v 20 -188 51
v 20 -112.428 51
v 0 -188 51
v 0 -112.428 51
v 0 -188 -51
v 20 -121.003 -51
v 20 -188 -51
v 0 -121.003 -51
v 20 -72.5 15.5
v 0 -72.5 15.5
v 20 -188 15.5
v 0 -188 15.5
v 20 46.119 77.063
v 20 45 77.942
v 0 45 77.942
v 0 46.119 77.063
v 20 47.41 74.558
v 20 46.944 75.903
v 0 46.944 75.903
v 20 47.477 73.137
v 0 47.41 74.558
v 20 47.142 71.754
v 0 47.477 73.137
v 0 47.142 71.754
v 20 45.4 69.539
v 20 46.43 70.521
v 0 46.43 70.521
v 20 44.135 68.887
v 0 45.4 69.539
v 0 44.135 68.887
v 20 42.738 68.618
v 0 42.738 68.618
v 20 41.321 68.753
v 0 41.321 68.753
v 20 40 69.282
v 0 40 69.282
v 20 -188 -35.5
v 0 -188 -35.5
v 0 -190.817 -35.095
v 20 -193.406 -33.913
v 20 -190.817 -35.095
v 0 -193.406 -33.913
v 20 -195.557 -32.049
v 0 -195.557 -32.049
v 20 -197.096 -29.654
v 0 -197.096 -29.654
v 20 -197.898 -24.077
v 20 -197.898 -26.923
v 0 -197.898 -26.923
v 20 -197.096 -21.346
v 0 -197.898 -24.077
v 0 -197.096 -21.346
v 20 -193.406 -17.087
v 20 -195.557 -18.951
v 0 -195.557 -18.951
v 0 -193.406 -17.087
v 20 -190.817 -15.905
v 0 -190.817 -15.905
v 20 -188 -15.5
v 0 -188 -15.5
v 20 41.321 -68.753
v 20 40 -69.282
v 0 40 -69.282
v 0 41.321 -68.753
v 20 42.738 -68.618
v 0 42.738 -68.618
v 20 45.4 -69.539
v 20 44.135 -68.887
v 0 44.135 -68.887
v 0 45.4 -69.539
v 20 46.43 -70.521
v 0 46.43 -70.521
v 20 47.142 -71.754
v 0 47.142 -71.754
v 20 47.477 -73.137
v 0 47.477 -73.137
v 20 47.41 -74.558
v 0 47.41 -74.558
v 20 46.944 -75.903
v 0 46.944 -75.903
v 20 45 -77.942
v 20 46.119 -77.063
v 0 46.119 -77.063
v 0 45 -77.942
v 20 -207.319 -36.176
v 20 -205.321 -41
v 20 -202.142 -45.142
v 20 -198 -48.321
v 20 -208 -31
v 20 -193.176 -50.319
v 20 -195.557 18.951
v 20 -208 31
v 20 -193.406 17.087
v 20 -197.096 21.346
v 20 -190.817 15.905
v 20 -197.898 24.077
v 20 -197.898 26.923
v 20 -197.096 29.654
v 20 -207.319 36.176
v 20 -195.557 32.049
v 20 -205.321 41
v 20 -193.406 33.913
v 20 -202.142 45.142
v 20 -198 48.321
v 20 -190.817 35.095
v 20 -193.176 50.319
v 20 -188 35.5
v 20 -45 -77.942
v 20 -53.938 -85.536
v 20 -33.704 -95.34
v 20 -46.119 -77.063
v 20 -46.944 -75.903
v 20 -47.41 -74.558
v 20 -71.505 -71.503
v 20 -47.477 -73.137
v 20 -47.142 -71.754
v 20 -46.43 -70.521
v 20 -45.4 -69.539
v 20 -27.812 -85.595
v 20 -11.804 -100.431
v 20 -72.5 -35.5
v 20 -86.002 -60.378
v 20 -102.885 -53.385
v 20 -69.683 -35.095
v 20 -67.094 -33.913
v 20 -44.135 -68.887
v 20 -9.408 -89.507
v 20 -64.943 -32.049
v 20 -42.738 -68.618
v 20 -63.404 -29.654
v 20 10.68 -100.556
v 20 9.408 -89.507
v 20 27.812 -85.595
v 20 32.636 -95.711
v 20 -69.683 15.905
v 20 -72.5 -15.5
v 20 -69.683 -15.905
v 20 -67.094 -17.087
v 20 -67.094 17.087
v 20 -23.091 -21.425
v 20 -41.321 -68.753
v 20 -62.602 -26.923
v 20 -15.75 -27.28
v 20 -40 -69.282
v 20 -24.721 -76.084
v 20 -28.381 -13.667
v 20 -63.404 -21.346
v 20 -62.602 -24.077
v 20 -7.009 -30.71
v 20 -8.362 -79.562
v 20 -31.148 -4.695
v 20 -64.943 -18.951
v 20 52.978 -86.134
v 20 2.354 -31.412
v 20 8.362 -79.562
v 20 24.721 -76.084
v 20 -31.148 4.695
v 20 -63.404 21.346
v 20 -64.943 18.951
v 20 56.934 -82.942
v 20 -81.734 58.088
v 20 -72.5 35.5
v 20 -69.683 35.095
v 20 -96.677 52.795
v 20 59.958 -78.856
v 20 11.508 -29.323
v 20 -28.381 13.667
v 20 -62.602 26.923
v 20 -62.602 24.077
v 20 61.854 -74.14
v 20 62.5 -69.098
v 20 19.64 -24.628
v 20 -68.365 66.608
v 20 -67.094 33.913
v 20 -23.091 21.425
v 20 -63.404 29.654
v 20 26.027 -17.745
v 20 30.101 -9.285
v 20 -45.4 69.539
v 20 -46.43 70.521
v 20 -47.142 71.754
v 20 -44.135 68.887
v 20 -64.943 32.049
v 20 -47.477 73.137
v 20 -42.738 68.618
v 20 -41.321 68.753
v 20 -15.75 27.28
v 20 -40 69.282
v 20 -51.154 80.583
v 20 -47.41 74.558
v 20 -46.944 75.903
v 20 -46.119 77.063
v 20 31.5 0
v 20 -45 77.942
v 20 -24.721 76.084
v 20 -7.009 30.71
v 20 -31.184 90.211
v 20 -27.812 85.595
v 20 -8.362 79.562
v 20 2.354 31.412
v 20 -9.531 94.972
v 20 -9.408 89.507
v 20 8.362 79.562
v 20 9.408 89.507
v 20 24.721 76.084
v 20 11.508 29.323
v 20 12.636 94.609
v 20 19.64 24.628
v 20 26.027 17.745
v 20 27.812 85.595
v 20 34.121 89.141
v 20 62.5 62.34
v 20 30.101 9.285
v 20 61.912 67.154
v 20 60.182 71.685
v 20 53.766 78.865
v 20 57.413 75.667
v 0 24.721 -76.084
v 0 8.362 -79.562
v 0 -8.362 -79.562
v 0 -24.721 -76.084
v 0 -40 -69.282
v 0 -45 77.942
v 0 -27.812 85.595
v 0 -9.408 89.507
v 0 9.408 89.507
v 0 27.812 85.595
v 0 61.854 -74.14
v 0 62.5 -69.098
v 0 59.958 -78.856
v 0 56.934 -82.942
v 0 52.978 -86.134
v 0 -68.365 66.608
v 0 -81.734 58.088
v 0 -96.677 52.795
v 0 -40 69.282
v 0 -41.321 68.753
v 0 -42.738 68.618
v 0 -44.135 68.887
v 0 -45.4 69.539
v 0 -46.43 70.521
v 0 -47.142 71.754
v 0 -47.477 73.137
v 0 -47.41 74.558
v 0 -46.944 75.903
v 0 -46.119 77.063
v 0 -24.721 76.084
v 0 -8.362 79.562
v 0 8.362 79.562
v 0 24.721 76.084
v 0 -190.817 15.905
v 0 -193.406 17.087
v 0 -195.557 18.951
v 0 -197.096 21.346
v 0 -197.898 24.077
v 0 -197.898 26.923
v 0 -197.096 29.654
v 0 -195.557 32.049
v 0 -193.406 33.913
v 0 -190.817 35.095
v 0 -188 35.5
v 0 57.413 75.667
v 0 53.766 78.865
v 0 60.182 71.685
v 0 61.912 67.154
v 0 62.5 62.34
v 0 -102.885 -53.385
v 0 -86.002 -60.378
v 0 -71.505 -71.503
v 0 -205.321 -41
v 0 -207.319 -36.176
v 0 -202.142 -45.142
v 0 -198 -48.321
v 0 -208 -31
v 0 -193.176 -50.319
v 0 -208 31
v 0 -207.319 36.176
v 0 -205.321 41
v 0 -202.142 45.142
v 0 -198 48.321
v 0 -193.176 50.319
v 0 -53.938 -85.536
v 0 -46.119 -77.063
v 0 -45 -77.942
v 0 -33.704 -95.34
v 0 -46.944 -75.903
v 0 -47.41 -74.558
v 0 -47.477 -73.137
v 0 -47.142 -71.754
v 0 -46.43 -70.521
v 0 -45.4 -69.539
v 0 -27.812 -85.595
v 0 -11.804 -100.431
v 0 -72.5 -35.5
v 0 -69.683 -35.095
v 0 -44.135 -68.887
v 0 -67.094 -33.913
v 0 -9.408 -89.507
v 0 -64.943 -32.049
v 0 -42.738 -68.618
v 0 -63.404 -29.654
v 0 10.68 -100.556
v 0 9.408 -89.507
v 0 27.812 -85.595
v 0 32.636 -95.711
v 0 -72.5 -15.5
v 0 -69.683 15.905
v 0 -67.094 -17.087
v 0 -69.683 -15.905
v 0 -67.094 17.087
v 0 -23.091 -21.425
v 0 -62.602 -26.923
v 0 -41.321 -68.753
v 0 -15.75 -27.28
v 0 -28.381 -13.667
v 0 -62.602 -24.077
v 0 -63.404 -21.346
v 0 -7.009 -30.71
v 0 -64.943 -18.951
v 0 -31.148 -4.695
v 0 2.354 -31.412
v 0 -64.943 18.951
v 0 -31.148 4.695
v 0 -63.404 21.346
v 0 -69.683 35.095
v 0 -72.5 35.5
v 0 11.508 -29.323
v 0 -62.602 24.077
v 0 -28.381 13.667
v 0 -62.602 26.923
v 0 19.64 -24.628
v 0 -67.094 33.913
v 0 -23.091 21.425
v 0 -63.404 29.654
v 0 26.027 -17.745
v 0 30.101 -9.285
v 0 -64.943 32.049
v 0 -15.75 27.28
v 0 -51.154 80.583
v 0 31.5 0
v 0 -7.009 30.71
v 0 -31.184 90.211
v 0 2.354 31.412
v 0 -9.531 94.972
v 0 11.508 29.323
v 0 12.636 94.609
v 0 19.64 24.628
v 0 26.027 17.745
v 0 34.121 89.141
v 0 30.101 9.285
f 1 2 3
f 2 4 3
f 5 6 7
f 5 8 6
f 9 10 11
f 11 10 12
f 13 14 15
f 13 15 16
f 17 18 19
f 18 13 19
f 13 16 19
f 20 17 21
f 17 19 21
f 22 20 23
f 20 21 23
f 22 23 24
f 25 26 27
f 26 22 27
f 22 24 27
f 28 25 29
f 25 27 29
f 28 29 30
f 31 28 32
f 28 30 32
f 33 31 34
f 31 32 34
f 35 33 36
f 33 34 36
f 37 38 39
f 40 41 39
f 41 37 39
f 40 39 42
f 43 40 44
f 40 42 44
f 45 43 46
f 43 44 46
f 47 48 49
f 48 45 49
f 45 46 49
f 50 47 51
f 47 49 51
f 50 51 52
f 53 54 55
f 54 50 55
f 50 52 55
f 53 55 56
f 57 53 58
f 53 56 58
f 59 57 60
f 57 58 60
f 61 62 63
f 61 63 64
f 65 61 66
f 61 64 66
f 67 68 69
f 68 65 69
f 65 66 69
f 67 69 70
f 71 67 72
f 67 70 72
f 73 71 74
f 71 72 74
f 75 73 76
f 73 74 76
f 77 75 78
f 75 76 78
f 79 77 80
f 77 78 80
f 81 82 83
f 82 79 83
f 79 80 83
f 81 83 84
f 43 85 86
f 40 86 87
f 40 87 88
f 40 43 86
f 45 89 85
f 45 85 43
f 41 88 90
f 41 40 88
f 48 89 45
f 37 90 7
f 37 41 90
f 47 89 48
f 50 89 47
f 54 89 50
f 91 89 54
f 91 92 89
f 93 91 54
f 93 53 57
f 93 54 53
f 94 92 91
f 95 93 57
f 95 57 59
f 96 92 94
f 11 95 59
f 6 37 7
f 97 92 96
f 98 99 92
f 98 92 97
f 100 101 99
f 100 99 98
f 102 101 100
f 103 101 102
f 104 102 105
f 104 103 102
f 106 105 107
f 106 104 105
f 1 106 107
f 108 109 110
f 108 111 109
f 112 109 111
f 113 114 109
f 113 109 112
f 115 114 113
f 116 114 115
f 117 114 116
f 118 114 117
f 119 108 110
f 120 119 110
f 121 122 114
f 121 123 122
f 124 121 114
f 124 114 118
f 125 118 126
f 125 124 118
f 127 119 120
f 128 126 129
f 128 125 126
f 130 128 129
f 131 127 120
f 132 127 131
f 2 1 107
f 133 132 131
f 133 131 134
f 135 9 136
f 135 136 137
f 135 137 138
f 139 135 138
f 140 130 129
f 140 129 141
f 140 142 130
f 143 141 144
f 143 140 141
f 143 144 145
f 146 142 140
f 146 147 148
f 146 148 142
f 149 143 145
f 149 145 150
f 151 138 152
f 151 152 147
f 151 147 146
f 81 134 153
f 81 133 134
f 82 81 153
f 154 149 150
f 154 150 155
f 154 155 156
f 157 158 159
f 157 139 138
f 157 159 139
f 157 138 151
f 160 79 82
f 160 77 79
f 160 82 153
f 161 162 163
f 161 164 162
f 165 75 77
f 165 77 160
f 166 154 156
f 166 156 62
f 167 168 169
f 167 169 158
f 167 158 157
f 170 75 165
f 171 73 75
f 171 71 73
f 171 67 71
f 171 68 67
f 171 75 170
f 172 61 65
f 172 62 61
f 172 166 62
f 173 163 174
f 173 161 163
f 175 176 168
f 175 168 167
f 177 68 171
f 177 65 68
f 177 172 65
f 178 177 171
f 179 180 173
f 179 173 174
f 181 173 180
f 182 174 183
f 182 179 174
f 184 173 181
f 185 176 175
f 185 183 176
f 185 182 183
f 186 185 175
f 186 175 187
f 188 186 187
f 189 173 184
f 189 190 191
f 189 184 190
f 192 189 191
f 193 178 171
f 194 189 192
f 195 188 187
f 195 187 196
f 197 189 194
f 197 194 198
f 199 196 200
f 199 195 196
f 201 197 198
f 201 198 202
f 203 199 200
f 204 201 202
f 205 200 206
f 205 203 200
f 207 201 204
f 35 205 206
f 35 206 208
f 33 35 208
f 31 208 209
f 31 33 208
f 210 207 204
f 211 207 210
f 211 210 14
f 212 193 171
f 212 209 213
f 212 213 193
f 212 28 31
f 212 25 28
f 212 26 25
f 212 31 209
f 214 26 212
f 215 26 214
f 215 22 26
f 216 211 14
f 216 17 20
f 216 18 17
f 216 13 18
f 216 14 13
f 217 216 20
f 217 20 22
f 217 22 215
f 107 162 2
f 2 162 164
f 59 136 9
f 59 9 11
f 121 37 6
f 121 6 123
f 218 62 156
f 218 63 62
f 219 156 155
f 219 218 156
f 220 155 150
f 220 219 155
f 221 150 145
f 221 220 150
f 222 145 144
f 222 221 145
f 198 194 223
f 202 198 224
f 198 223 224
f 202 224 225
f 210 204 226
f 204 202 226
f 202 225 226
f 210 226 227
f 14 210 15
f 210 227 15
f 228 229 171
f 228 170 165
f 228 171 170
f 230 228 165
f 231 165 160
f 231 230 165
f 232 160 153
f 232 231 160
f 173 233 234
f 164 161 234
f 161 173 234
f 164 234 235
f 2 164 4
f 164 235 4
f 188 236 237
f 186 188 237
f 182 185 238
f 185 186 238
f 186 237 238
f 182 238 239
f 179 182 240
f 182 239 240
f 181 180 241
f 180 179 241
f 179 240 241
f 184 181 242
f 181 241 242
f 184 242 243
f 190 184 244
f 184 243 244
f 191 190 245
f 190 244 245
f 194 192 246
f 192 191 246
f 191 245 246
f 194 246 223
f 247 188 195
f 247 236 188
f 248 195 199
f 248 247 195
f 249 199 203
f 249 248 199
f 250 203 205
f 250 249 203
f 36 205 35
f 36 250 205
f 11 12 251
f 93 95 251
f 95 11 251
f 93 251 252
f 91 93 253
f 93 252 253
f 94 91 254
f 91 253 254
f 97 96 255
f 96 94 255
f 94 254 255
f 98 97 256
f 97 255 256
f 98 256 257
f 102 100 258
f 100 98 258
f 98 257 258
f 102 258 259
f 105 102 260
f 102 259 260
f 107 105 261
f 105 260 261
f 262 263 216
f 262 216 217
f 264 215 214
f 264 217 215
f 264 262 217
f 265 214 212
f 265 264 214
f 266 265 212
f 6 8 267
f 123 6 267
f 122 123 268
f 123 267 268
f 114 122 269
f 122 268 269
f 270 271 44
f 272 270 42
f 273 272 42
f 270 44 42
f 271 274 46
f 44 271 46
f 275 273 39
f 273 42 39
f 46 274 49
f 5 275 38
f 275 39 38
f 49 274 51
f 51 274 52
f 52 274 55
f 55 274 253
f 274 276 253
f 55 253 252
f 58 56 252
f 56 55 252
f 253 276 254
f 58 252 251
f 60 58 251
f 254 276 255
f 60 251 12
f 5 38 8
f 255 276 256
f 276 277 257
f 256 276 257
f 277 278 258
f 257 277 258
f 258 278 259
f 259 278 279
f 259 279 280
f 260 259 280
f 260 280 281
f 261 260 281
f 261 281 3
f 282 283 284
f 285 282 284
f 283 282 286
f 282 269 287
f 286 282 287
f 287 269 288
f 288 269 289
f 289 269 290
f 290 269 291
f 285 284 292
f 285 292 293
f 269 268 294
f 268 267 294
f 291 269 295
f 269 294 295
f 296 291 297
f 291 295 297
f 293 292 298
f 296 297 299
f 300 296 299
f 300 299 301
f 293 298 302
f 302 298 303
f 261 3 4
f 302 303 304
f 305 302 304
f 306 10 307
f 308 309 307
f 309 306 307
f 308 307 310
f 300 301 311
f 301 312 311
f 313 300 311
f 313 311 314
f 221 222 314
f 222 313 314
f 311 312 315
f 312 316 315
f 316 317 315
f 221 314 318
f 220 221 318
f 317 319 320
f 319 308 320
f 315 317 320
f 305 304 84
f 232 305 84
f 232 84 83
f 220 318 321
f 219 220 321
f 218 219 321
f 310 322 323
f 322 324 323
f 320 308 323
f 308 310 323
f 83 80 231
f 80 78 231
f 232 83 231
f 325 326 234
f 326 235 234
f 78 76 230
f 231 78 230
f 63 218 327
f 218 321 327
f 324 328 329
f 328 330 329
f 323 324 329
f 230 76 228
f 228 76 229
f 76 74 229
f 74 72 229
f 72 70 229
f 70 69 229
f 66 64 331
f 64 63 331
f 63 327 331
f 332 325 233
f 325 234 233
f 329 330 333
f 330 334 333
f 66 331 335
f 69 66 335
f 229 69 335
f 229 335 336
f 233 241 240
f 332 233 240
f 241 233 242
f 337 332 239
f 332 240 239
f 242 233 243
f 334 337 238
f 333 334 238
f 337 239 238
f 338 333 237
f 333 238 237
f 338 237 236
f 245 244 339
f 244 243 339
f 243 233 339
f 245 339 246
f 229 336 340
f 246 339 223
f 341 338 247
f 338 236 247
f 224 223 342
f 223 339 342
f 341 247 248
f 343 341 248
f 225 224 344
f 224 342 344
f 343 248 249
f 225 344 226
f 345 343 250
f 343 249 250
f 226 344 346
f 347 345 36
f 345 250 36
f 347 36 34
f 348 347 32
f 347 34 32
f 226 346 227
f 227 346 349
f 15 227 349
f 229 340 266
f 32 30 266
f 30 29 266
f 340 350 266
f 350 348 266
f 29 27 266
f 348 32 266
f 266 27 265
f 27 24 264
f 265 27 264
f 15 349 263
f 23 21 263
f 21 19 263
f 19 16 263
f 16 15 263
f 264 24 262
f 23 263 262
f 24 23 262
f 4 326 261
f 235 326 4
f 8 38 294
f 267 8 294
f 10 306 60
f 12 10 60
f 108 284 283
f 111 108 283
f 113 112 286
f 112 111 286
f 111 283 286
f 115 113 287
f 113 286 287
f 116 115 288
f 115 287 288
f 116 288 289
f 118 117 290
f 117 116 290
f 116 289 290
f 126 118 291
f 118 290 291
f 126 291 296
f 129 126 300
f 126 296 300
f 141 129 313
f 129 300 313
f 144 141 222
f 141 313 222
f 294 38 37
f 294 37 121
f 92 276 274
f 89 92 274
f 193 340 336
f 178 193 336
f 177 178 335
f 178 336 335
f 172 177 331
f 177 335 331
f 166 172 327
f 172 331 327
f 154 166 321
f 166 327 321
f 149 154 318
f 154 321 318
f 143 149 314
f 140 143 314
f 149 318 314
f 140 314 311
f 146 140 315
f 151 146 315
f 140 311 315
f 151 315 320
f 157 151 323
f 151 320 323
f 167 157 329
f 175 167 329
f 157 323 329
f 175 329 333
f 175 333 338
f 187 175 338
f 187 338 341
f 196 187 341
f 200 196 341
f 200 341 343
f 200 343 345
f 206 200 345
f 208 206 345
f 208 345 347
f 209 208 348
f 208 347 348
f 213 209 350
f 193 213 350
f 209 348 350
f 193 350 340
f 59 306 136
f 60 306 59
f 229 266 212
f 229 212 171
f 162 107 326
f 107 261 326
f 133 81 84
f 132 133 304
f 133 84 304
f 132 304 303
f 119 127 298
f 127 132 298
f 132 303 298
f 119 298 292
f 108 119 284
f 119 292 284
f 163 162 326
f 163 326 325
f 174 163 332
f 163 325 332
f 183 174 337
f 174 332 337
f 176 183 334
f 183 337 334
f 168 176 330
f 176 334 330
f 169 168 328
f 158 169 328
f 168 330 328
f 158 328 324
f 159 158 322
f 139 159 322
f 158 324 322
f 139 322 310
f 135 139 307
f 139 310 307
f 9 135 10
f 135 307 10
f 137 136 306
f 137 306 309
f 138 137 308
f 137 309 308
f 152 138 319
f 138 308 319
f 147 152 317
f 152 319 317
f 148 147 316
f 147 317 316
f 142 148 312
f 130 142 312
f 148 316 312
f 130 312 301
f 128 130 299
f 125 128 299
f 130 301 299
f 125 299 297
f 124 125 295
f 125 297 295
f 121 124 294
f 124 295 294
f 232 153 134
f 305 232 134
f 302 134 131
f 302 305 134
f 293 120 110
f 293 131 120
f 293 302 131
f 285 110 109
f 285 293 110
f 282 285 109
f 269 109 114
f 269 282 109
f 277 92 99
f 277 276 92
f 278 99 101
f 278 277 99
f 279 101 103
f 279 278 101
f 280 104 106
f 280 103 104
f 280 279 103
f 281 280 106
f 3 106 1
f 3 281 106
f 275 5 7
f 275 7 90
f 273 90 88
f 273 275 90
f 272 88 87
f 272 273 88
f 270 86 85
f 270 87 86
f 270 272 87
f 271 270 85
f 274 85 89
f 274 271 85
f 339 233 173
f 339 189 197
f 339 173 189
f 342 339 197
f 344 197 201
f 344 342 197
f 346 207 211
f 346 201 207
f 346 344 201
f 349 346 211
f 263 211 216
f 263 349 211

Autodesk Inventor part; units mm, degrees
ref_plane "YZ Plane" through (0, 0, 0) normal (1, 0, 0) x (0, 1, 0)
ref_plane "XZ Plane" through (0, 0, 0) normal (0, 1, 0) x (-1, 0, 0)
ref_plane "XY Plane" through (0, 0, 0) normal (0, 0, 1) x (1, 0, 0)
sketch "Sketch1" plane through (0, 0, 0) normal (1, 0, 0) x (0, 1, 0)
  point P0 (0, 0)
sketch "Sketch2" plane through (0, 0, 0) normal (1, 0, 0) x (0, 1, 0)
  circle A0 centre (0, 0) radius 31.5
  arc A1 (40, 69.282) -> (-40, 69.282) centre (0, 0) ccw
  line L0 (0, 0) -> (-40, 69.282) construction
  line L1 (0, 0) -> (80, 0) construction
  line L2 (0, 0) -> (40, 69.282) construction
  line L3 (40, 69.282) -> (45, 77.9423)
  line L4 (-40, 69.282) -> (-45, 77.9423)
  arc A2 (40, 69.282) -> (45, 77.9423) centre (42.5, 73.6122) ccw
  arc A3 (-45, 77.9423) -> (-40, 69.282) centre (-42.5, 73.6122) ccw
  arc A4 (-40, -69.282) -> (40, -69.282) centre (0, 0) ccw
  line L5 (0, 0) -> (40, -69.282) construction
  line L6 (0, 0) -> (80, 0) construction
  line L7 (0, 0) -> (-40, -69.282) construction
  line L8 (-40, -69.282) -> (-45, -77.9423)
  arc A5 (45, -77.9423) -> (40, -69.282) centre (42.5, -73.6122) ccw
  arc A6 (-40, -69.282) -> (-45, -77.9423) centre (-42.5, -73.6122) ccw
  arc A7 (45, 77.9423) -> (-45, 77.9423) centre (0, 0) ccw
  arc A8 (-45, -77.9423) -> (45, -77.9423) centre (0, 0) ccw
  arc A9 (40, 69.282) -> (-40, 69.282) centre (0, 0) ccw
  arc A10 (-40, -69.282) -> (40, -69.282) centre (0, 0) ccw
  line L9 (0, 0) -> (-72.5, 0)
  line L10 (-72.5, 0) -> (-72.5, -15.5)
  line L11 (-72.5, -15.5) -> (-72.5, -35.5)
  line L12 (-72.5, -35.5) -> (-72.5, -51)
  line L13 (-121.003, -51) -> (-188, -51)
  line L14 (-188, -51) -> (-188, -35.5)
  line L15 (-188, -35.5) -> (-72.5, -35.5)
  line L16 (-72.5, -15.5) -> (-188, -15.5)
  line L17 (-188, -15.5) -> (-188, -35.5)
  circle A11 centre (-72.5, -25.5) radius 10
  circle A12 centre (-188, -25.5) radius 10
  line L18 (-72.5, 0) -> (-72.5, 15.5)
  line L19 (-72.5, 15.5) -> (-72.5, 35.5)
  line L20 (-72.5, 35.5) -> (-72.5, 51)
  line L21 (-112.428, 51) -> (-188, 51)
  line L22 (-188, 51) -> (-188, 35.5)
  line L23 (-188, 35.5) -> (-72.5, 35.5)
  line L24 (-72.5, 15.5) -> (-188, 15.5)
  line L25 (-188, 15.5) -> (-188, 35.5)
  circle A13 centre (-188, 25.5) radius 10
  circle A14 centre (-72.5, 25.5) radius 10
  line L26 (-188, 51) -> (-188, 51)
  line L27 (-208, 31) -> (-208, -31)
  line L28 (-188, -51) -> (-188, -51)
  arc A15 (-208, -31) -> (-188, -51) centre (-188, -31) ccw
  arc A16 (-188, 51) -> (-208, 31) centre (-188, 31) ccw
  line L29 (-188, 25.5) -> (-72.5, 25.5)
  arc A17 (-98.8167, 35.5) -> (-103.8497, 15.5) centre (0, 0) ccw
  arc A18 (-71.5049, -71.5031) -> (-121.003, -51) centre (-121.003, -121) ccw
  arc A19 (-112.428, 51) -> (-68.365, 66.6083) centre (-112.428, 121) ccw
  line L30 (0, 0) -> (62.5, 0)
  line L31 (62.5, 0) -> (62.5, 62.3398)
  line L32 (62.5, 0) -> (62.5, -69.098)
  arc A20 (-71.5049, -71.5031) -> (52.978, -86.1335) centre (0, 0) ccw
  arc A21 (53.7659, 78.8649) -> (-68.365, 66.6083) centre (0, 0) ccw
  arc A22 (62.5, 62.3398) -> (53.7659, 78.8649) centre (42.5, 62.3398) ccw
  arc A23 (52.978, -86.1335) -> (62.5, -69.098) centre (42.5, -69.098) ccw
  point P0 (-208, 51)
  point P1 (-87.3193, 51)
  point P2 (-87.3193, -51)
  point P3 (62.5, 72.1401)
  point P4 (62.5, -79.4947)
  dimension "d0" = 63
  dimension "d4" = 120
  dimension "d5" = 60
  dimension "d6" = 60
  dimension "d7" = 60
  dimension "d8" = 10
  dimension "d9" = 10
  dimension "d10" = 72.5
  dimension "d11" = 15.5
  dimension "d12" = 20
  dimension "d13" = 15.5
  dimension "d14" = 115.5
  dimension "d15" = 15.5
  dimension "d16" = 20
  dimension "d17" = 15.5
  dimension "d18" = 20
  dimension "d20" = 20
  dimension "d21" = 20
  dimension "d22" = 115.5
  dimension "d23" = 70
  dimension "d24" = 70
  dimension "d25" = 62.5
  dimension "d26" = 20
  dimension "d27" = 20
extrude "Extrusion1" add sketch "Sketch2" along normal blind 20 contours L30 L32 A23 A20 A18 L13 L14 L15 A11 L10 L9 A0 | A0 L9 L18 A14 L23 L22 L21 A19 A21 A22 L31 L30 | L10 L16 A12 L14 A15 L27 A16 L22 A13 L24 L18
